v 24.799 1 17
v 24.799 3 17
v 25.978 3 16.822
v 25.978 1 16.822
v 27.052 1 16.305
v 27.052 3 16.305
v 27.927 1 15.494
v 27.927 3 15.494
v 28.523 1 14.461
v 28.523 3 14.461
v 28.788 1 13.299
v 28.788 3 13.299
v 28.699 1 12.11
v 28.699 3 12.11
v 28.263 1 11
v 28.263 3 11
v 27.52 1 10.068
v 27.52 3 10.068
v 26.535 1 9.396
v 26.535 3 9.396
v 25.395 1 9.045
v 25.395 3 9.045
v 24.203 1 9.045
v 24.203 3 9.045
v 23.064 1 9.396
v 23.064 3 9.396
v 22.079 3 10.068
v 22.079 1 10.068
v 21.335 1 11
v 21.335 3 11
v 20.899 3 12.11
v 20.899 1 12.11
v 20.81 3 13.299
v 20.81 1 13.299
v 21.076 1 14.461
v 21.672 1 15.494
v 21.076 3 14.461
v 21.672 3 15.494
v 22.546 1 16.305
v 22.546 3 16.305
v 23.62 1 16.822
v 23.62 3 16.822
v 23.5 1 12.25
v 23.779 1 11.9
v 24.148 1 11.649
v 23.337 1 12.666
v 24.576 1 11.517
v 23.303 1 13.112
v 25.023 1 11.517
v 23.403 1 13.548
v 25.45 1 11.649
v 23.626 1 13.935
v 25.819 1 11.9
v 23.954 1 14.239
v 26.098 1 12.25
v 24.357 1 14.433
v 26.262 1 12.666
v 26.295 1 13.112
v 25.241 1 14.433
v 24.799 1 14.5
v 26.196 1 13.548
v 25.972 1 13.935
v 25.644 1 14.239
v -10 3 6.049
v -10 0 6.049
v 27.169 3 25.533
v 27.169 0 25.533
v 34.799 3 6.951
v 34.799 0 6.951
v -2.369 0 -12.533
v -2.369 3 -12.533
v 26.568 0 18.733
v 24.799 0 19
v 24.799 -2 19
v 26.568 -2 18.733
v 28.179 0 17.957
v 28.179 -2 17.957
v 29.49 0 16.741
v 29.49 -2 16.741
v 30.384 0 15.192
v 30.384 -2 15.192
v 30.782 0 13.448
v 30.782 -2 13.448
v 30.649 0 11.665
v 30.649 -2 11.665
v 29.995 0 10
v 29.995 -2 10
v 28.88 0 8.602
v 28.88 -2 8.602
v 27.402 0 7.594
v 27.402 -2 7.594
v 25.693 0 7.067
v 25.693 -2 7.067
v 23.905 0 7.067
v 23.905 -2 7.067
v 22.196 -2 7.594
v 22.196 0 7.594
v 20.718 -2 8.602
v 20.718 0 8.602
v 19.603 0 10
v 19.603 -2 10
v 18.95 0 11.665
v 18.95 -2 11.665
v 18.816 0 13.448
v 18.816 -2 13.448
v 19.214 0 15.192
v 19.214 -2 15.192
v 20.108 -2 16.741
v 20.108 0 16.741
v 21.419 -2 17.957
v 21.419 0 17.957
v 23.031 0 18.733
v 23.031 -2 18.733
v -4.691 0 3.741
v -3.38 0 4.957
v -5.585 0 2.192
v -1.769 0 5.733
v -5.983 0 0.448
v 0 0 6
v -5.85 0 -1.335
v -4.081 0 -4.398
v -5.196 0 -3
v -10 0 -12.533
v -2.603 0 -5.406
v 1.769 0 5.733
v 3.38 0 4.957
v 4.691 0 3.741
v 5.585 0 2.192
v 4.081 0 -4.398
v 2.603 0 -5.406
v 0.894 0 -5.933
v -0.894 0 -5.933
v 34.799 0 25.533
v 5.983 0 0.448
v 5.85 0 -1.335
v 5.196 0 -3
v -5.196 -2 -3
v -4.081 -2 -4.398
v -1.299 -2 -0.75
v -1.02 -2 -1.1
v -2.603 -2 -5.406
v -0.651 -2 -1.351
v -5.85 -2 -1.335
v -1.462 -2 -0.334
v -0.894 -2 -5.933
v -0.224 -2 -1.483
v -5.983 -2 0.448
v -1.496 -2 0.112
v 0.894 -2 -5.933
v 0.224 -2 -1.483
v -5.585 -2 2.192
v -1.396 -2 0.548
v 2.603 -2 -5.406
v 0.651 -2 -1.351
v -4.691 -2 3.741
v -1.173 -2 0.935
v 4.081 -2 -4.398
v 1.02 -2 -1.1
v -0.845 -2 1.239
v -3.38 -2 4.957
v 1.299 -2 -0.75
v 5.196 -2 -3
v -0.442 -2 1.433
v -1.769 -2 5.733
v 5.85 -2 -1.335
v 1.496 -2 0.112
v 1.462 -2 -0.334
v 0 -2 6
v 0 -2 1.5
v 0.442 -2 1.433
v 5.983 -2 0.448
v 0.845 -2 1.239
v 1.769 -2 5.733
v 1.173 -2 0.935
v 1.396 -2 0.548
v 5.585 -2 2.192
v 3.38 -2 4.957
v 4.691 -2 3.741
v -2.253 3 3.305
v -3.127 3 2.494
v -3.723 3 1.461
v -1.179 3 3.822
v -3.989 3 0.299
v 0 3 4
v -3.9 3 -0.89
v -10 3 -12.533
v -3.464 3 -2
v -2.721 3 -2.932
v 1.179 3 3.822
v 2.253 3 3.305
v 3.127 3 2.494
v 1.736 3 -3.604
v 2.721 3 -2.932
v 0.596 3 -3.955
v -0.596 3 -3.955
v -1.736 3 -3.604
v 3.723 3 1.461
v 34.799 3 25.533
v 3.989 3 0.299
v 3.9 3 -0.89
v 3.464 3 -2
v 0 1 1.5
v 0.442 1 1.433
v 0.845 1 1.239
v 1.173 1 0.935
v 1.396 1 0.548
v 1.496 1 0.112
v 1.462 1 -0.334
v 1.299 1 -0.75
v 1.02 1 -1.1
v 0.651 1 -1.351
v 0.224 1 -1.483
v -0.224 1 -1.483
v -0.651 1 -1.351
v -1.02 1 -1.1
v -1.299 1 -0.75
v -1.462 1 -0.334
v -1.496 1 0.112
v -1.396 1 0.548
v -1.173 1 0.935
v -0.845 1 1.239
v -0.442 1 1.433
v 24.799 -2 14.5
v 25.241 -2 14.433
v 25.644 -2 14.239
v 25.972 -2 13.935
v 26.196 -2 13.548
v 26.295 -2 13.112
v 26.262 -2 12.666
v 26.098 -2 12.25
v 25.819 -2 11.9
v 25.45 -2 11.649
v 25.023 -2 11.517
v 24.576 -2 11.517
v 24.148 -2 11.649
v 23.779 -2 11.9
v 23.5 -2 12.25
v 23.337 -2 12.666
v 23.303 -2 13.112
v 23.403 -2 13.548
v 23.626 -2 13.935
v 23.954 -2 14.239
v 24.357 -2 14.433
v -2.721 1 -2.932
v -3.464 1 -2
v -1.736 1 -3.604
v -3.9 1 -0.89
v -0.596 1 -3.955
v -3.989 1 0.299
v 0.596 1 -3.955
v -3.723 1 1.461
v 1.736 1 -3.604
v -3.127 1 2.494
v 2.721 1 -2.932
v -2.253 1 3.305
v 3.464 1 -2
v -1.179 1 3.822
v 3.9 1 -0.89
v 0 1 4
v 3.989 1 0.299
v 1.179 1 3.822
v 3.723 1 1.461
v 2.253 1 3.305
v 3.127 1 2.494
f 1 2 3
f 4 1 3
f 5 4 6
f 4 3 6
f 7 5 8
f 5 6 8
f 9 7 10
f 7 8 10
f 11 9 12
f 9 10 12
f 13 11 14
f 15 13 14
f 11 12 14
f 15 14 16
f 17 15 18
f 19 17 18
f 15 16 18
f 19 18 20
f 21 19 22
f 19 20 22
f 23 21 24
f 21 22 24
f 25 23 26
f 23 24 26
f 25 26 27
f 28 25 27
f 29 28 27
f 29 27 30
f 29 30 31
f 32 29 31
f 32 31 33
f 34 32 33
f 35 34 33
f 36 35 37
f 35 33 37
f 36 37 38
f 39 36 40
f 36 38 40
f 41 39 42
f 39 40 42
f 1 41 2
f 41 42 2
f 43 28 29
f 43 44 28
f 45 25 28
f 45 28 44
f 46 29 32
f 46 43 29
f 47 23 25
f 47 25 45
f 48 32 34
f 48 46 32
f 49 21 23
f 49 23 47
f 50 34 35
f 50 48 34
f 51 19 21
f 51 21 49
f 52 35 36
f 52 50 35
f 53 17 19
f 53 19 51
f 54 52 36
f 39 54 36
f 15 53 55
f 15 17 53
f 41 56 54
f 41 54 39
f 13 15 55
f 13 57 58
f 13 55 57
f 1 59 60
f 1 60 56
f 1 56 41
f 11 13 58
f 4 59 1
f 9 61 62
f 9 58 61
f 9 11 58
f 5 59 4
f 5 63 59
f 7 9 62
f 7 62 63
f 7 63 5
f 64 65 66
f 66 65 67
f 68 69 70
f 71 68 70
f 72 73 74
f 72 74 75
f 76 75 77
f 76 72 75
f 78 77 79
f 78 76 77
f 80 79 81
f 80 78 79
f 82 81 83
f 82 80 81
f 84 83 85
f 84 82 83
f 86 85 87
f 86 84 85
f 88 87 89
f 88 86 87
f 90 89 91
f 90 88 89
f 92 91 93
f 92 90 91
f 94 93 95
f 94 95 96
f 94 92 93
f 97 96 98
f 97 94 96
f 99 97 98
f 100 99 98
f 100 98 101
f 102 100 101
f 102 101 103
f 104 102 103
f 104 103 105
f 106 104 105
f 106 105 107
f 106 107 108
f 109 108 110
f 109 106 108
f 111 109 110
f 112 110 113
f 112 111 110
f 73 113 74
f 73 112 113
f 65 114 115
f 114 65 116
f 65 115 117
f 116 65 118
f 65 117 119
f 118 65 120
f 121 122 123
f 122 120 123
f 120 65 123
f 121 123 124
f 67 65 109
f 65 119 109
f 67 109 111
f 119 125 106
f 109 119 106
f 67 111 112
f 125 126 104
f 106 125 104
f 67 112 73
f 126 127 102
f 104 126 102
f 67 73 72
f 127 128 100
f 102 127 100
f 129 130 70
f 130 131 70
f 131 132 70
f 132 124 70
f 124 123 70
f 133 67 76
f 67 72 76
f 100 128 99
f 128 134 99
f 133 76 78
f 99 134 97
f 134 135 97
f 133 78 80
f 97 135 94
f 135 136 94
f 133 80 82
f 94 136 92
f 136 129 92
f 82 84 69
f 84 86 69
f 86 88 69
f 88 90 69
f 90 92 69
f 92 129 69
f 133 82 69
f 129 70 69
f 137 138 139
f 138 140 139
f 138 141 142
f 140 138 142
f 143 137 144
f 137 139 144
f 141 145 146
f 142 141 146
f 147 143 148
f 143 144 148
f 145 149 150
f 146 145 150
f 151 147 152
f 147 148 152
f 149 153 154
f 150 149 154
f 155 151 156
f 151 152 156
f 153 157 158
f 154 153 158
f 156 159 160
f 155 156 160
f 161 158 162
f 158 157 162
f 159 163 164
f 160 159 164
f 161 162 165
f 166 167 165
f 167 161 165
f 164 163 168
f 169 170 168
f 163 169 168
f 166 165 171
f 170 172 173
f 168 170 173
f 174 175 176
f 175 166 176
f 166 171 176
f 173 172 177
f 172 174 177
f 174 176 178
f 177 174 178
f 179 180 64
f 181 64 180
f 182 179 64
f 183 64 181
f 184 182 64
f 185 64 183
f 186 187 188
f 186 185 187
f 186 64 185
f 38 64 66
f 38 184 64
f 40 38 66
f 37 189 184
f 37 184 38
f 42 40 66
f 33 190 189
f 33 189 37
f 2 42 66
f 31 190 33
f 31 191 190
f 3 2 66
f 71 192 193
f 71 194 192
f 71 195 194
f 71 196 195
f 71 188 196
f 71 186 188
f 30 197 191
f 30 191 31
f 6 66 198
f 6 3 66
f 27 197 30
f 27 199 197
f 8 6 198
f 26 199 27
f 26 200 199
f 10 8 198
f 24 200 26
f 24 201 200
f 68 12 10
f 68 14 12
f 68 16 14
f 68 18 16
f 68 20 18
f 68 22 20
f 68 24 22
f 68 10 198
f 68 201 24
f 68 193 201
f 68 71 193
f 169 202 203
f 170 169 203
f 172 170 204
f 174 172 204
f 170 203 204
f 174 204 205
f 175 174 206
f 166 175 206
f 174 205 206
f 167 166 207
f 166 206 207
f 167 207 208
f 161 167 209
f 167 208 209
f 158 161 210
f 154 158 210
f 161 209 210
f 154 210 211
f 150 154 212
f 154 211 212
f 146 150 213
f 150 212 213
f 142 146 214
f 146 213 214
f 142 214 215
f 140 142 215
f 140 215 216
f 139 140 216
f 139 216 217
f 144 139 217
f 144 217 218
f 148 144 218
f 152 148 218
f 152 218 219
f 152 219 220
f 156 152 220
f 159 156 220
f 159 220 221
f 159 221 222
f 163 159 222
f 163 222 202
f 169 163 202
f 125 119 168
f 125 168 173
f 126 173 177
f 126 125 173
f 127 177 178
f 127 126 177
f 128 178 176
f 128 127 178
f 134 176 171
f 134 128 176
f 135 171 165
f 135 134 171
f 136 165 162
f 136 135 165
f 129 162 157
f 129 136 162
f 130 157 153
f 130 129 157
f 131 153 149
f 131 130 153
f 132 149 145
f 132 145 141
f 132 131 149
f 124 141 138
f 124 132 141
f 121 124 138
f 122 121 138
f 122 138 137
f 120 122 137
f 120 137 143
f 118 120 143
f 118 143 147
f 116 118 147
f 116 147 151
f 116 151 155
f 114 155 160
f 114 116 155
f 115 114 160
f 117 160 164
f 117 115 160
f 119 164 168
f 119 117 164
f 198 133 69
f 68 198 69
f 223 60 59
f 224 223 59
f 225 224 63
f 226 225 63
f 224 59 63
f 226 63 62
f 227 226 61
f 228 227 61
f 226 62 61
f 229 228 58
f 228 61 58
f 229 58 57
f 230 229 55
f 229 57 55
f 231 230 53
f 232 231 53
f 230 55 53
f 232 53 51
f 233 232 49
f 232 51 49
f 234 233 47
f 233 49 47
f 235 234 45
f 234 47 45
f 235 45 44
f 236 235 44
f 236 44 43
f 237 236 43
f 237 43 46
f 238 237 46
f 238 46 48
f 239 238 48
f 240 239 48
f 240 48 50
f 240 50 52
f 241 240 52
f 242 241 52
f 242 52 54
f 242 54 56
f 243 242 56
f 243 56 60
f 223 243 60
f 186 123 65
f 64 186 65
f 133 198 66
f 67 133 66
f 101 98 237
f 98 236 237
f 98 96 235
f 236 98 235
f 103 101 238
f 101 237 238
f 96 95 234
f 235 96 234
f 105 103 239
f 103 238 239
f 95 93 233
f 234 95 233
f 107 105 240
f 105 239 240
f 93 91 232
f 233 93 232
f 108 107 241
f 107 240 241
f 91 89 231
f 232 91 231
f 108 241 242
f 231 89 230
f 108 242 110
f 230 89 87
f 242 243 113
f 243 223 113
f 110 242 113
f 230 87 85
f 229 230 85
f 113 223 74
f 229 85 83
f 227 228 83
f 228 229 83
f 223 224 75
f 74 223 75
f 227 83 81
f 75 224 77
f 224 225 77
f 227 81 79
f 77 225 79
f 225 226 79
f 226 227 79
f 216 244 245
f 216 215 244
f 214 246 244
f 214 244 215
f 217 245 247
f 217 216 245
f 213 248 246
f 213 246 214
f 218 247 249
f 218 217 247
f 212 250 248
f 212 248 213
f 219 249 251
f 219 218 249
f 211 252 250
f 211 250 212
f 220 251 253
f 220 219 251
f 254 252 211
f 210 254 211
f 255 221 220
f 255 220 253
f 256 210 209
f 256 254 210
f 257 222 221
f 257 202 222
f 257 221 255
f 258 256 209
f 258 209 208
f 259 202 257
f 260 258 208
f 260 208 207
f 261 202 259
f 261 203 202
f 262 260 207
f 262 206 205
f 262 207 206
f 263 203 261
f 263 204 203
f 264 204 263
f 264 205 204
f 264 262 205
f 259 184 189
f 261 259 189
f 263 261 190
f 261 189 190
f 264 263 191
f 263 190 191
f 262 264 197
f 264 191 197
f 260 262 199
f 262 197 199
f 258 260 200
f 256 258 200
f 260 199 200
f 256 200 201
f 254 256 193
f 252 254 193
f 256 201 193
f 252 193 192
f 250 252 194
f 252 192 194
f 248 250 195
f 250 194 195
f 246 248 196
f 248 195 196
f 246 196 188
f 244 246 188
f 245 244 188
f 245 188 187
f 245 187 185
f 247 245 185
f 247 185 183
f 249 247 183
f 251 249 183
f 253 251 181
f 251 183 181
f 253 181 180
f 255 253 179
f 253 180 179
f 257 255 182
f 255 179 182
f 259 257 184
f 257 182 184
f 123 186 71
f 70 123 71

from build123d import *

# Parameters (mm, degrees)
BOSS_EXTRUDE1_DEPTH = 3
SKETCH1_R           = 6
BOSS_EXTRUDE3_DEPTH = 2
SKETCH4_R           = 1.5
CUT_EXTRUDE1_DEPTH  = 46.914811248
SKETCH5_R           = 4
CUT_EXTRUDE2_DEPTH  = 2
CUT_EXTRUDE3_DEPTH  = 46.914811248


with BuildPart() as part:
    # Sketch3 → Boss-Extrude1 (new body)
    with BuildSketch(Plane(origin=(0, 0, 0), x_dir=(1, 0, 0), z_dir=(0, 1, 0))):
        Polygon((-10, 16.53279569), (-10, -6.048583789), (34.799193535, -29.53279569), (34.799193535, -6.951416211), align=None)
    extrude(amount=BOSS_EXTRUDE1_DEPTH)

    # Sketch1 → Boss-Extrude3 (add)
    with BuildSketch(Plane(origin=(0, 0, 0), x_dir=(1, 0, 0), z_dir=(0, 1, 0))):
        with Locations(Location((0, 0, 0), (0, 0, 270))):
            Circle(SKETCH1_R)
        with Locations(Location((24.799193535, -13, 0), (0, 0, 270))):
            Circle(SKETCH1_R)
    extrude(amount=-BOSS_EXTRUDE3_DEPTH)

    # Sketch4 → Cut-Extrude1 (cut, through all)
    with BuildSketch(Plane(origin=(0, 3, 0), x_dir=(1, 0, 0), z_dir=(0, 1, 0))):
        with Locations(Location((0, 0, 0), (0, 0, 270))):
            Circle(SKETCH4_R)
        with Locations(Location((24.799193535, -13, 0), (0, 0, 270))):
            Circle(SKETCH4_R)
    extrude(amount=-CUT_EXTRUDE1_DEPTH, mode=Mode.SUBTRACT)

    # Sketch5 → Cut-Extrude2 (cut)
    with BuildSketch(Plane(origin=(0, 3, 0), x_dir=(1, 0, 0), z_dir=(0, 1, 0))):
        with Locations(Location((0, 0, 0), (0, 0, 270))):
            Circle(SKETCH5_R)
        with Locations(Location((24.799193535, -13, 0), (0, 0, 270))):
            Circle(SKETCH5_R)
    extrude(amount=-CUT_EXTRUDE2_DEPTH, mode=Mode.SUBTRACT)

    # Sketch7 → Cut-Extrude3 (cut, through all)
    with BuildSketch(Plane(origin=(0, 3, 0), x_dir=(1, 0, 0), z_dir=(0, 1, 0))):
        Polygon((-10, 16.53279569), (-10, 12.53279569), (-2.369478912, 12.53279569), align=None)
        Polygon((34.799193535, -29.53279569), (34.799193535, -25.53279569), (27.168672447, -25.53279569), align=None)
    extrude(amount=-CUT_EXTRUDE3_DEPTH, mode=Mode.SUBTRACT)


solid = part.part
